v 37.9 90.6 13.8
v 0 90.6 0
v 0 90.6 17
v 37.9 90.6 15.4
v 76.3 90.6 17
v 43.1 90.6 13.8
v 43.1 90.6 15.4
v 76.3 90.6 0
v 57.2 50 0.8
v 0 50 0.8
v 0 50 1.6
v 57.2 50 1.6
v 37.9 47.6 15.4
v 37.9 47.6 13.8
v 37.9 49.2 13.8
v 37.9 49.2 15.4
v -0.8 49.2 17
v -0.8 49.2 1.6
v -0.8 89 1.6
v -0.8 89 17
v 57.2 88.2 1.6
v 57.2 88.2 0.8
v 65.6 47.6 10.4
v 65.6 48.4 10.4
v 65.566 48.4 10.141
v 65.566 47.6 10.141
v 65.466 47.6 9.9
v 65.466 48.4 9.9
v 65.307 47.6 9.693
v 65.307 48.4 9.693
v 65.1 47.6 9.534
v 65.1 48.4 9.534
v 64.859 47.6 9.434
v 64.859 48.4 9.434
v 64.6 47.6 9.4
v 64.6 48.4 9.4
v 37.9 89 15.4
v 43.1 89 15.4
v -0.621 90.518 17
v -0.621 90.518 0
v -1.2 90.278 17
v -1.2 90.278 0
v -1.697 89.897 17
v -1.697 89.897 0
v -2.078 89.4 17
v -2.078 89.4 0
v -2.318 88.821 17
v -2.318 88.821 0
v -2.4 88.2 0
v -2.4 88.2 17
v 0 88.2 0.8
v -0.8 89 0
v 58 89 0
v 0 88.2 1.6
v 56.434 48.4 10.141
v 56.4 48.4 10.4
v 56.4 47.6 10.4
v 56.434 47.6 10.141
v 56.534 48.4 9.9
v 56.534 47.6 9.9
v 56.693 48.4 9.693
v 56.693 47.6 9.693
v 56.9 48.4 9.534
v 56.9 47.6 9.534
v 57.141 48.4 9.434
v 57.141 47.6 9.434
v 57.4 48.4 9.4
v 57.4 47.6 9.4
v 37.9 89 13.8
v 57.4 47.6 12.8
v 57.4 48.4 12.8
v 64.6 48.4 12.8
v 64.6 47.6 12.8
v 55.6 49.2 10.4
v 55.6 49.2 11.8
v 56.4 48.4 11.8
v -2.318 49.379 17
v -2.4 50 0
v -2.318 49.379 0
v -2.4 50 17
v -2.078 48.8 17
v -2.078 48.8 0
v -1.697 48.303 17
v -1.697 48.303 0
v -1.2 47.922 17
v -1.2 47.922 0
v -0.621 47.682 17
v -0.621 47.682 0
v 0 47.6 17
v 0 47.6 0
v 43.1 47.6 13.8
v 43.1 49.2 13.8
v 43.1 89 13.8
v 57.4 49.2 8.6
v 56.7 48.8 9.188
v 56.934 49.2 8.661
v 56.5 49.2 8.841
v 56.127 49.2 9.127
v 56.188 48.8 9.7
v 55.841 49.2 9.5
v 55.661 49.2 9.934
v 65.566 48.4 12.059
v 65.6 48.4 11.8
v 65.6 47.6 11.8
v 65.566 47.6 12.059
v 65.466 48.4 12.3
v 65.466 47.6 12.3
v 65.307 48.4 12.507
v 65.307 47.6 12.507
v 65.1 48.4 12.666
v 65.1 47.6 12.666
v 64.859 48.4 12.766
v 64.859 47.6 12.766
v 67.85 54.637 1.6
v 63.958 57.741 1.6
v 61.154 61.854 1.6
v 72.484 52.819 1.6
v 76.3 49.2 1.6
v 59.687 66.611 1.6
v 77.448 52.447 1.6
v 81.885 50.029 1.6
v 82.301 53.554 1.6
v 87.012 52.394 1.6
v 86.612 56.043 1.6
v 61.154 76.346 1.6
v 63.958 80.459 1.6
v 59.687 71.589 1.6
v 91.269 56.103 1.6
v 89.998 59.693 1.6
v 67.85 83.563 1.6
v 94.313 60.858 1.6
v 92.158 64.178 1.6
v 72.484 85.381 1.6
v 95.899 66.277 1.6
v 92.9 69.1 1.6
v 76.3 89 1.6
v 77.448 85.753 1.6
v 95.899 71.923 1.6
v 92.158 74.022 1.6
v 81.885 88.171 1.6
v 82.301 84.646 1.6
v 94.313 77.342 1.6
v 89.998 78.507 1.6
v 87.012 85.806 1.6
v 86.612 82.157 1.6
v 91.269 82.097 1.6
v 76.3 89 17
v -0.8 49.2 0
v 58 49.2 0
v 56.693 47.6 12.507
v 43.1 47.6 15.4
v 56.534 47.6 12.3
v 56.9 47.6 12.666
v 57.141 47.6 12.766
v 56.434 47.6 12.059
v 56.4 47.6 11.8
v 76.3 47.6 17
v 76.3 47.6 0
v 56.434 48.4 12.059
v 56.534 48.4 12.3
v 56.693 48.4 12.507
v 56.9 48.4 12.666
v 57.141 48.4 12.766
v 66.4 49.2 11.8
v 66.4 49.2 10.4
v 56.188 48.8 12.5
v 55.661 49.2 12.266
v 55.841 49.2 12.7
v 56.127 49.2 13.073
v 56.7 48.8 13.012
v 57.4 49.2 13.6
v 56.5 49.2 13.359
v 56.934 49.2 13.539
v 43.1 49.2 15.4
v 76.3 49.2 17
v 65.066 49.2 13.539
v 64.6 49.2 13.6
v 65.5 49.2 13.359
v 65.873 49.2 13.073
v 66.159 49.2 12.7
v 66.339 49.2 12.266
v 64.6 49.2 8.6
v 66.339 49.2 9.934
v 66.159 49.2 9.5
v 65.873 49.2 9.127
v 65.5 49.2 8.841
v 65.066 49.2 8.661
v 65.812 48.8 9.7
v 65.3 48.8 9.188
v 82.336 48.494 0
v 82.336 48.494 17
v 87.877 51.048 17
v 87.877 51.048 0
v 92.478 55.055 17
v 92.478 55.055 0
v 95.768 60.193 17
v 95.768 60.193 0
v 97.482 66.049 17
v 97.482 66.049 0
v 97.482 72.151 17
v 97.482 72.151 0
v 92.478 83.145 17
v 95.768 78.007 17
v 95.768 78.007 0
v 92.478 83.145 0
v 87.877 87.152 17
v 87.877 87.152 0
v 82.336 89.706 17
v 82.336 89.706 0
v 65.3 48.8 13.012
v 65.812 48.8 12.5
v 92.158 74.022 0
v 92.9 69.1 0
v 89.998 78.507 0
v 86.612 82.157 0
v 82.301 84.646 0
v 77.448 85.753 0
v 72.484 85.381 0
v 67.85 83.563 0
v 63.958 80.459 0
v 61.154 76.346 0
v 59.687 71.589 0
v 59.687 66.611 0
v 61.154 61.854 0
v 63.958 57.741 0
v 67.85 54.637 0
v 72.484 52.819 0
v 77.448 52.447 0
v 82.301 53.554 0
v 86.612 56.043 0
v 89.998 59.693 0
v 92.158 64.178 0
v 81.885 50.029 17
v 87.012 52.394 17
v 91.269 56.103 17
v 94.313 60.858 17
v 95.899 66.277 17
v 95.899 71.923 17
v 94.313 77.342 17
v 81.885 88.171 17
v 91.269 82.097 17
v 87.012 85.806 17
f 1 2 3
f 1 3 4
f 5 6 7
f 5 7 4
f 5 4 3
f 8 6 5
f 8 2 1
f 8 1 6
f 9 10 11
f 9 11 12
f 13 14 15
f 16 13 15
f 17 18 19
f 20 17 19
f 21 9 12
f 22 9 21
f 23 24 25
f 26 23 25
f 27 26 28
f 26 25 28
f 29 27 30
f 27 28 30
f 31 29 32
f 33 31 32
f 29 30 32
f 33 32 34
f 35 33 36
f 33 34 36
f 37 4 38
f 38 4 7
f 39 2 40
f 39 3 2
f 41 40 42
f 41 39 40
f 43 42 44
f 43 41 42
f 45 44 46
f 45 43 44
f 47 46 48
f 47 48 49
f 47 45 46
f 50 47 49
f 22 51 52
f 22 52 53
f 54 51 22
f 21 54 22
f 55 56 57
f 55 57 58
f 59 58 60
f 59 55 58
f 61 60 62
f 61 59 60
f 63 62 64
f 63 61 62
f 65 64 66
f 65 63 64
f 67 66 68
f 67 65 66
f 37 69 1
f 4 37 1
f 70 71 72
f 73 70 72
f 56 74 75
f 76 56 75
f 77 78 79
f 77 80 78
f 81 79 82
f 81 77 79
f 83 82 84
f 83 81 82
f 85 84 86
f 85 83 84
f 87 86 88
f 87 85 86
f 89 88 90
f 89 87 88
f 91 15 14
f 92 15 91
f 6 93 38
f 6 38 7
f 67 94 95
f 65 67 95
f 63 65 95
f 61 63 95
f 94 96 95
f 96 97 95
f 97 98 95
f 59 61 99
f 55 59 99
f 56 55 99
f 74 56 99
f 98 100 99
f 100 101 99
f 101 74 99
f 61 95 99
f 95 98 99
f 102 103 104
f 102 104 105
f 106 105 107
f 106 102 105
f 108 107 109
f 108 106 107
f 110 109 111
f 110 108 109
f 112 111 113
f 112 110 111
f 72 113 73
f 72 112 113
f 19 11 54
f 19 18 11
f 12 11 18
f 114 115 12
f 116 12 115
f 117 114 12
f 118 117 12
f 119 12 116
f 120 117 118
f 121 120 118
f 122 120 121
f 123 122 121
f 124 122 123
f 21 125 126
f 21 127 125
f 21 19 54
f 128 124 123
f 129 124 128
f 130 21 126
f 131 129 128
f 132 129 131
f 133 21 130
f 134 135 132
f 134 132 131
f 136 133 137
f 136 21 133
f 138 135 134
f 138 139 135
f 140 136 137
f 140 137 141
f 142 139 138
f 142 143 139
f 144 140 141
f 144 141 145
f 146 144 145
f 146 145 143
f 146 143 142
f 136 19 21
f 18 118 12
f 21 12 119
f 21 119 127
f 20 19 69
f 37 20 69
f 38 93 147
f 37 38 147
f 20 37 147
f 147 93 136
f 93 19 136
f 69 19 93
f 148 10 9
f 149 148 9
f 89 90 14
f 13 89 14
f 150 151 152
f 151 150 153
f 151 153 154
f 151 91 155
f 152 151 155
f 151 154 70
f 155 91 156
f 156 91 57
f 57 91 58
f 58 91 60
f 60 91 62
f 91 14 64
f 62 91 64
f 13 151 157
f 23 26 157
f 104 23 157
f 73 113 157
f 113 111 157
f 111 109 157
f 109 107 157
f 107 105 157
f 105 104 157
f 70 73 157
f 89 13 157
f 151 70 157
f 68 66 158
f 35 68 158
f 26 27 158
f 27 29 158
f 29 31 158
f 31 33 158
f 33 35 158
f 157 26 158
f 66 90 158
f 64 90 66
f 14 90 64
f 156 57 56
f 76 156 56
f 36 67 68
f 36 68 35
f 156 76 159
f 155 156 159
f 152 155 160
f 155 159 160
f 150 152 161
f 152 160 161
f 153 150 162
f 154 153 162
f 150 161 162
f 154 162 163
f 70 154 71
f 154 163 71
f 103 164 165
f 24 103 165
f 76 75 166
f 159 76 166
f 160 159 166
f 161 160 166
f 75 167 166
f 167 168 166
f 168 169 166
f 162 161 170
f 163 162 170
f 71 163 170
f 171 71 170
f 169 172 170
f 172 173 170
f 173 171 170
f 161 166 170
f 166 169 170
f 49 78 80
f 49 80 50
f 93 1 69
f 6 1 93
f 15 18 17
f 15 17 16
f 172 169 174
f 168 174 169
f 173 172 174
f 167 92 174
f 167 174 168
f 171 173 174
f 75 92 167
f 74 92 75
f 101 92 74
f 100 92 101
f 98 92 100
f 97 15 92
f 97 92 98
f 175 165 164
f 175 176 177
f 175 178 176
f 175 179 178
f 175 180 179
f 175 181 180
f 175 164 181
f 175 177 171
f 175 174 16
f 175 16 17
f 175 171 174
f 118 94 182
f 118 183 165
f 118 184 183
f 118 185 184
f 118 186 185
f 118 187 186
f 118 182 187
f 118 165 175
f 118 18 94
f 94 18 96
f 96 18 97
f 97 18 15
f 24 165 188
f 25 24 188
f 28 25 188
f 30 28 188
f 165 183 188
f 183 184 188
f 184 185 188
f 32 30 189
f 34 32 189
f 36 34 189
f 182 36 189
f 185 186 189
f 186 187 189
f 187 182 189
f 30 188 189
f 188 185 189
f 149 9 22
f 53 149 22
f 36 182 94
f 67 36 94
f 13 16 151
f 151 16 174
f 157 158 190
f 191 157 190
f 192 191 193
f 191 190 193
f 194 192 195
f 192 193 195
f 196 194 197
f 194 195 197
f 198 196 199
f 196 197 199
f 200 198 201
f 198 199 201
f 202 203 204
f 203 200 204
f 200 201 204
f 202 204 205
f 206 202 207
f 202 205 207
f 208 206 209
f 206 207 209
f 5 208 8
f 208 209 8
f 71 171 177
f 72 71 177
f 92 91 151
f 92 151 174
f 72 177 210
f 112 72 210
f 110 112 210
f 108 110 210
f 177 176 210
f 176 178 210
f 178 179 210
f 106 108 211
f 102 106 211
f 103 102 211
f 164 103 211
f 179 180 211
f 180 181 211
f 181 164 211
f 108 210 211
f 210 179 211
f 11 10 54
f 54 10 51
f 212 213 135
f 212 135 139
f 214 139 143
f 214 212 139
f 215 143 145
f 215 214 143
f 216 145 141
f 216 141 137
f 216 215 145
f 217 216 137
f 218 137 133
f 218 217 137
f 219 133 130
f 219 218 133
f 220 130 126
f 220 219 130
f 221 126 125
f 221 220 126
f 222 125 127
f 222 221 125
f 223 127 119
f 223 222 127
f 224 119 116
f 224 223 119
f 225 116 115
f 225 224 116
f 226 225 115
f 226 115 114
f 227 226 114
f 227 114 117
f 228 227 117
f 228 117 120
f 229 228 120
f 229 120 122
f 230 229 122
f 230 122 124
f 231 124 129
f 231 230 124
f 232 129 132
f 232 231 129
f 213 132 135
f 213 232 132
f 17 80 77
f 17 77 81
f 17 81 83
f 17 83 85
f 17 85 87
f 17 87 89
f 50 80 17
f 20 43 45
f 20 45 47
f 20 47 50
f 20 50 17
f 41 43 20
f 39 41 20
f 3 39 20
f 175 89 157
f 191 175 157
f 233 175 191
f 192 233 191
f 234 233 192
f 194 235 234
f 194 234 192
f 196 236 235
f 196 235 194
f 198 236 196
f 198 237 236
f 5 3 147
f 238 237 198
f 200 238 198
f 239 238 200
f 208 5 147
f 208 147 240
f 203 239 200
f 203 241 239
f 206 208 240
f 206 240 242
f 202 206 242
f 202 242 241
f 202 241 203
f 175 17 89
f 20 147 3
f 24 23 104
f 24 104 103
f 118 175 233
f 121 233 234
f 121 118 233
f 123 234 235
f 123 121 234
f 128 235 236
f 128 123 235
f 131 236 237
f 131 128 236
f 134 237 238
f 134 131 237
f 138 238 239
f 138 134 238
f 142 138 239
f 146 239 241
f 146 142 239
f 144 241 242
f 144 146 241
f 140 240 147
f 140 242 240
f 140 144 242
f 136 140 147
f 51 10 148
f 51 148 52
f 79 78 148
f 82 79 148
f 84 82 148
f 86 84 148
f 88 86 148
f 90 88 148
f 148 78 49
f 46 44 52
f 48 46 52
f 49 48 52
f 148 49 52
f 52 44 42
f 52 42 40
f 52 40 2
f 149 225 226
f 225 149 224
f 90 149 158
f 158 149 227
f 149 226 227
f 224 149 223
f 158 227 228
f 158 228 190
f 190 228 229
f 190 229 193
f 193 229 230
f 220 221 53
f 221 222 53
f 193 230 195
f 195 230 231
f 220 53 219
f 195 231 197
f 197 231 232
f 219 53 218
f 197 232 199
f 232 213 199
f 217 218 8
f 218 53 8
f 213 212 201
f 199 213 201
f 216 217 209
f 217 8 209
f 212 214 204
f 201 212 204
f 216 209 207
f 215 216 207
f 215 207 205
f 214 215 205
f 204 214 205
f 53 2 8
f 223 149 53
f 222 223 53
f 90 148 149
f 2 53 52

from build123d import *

# Parameters (mm, degrees)
BOX011_W          = 9.2
BOX011_H          = 10
BOX011_DEPTH      = 3.4
FILLET005_R       = 1
BOX010_W          = 5.2
BOX010_H          = 50
BOX010_DEPTH      = 1.6
BOX008_W          = 57.2
BOX008_H          = 38.2
BOX008_DEPTH      = 1.6
CYLINDER012_R     = 16.7
CYLINDER012_DEPTH = 1.6
CYLINDER011_R     = 19.9
CYLINDER011_DEPTH = 17
BOX007_W          = 77.1
BOX007_H          = 39.8
BOX007_DEPTH      = 17
CYLINDER010_R     = 21.5
CYLINDER010_DEPTH = 17
BOX006_W          = 78.7
BOX006_H          = 43
BOX006_DEPTH      = 17
FILLET002_R       = 2.4
CHAMFER005_SIZE   = 0.8
CHAMFER013_SIZE   = 0.8


with BuildPart() as usb:
    # Box011 → Box011 (new body)
    with BuildSketch(Plane(origin=(56.4, 45, 9.4), x_dir=(1, 0, 0), z_dir=(0, 0, 1))):
        with Locations((4.6, 5)):
            Rectangle(BOX011_W, BOX011_H)
    extrude(amount=BOX011_DEPTH)

    # Fillet005
    fillet005_edges = [usb.edges().sort_by_distance(p)[0] for p in [
        (56.4, 50, 12.8),
        (56.4, 50, 9.4),
        (65.6, 50, 12.8),
        (65.6, 50, 9.4),
    ]]
    fillet(fillet005_edges, radius=FILLET005_R)


with BuildPart() as w_rfel010:
    # Box010 → Box010 (new body)
    with BuildSketch(Plane(origin=(37.9, 45, 13.8), x_dir=(1, 0, 0), z_dir=(0, 0, 1))):
        with Locations((2.6, 25)):
            Rectangle(BOX010_W, BOX010_H)
    extrude(amount=BOX010_DEPTH)


with BuildPart() as w_rfel008:
    # Box008 → Box008 (new body)
    with BuildSketch(Plane(origin=(0, 50, 0), x_dir=(1, 0, 0), z_dir=(0, 0, 1))):
        with Locations((28.6, 19.1)):
            Rectangle(BOX008_W, BOX008_H)
    extrude(amount=BOX008_DEPTH)


with BuildPart() as zylinder012:
    # Cylinder012 → Cylinder012 (new body)
    with BuildSketch(Plane(origin=(76.2, 69.1, 0), x_dir=(1, 0, 0), z_dir=(0, 0, 1))):
        Circle(CYLINDER012_R)
    extrude(amount=CYLINDER012_DEPTH)


with BuildPart() as zylinder011:
    # Cylinder011 → Cylinder011 (new body)
    with BuildSketch(Plane(origin=(76.2, 69.1, 1.6), x_dir=(1, 0, 0), z_dir=(0, 0, 1))):
        Circle(CYLINDER011_R)
    extrude(amount=CYLINDER011_DEPTH)


with BuildPart() as fusion009:
    # Box007 → Box007 (new body)
    with BuildSketch(Plane(origin=(-0.8, 49.2, 1.6), x_dir=(1, 0, 0), z_dir=(0, 0, 1))):
        with Locations((38.55, 19.9)):
            Rectangle(BOX007_W, BOX007_H)
    extrude(amount=BOX007_DEPTH)

    # Fusion009: union Zylinder011
    add(zylinder011.part)


with BuildPart() as zylinder010:
    # Cylinder010 → Cylinder010 (new body)
    with BuildSketch(Plane(origin=(76.2, 69.1, 0), x_dir=(1, 0, 0), z_dir=(0, 0, 1))):
        Circle(CYLINDER010_R)
    extrude(amount=CYLINDER010_DEPTH)


with BuildPart() as top:
    # Box006 → Box006 (new body)
    with BuildSketch(Plane(origin=(-2.4, 47.6, 0), x_dir=(1, 0, 0), z_dir=(0, 0, 1))):
        with Locations((39.35, 21.5)):
            Rectangle(BOX006_W, BOX006_H)
    extrude(amount=BOX006_DEPTH)

    # Fusion008: union Zylinder010
    add(zylinder010.part)

    # Cut004: cut Fusion009
    add(fusion009.part, mode=Mode.SUBTRACT)

    # Fillet002
    fillet002_edges = [top.edges().sort_by_distance(p)[0] for p in [
        (-2.4, 47.6, 8.5),
        (-2.4, 90.6, 8.5),
    ]]
    fillet(fillet002_edges, radius=FILLET002_R)

    # Cut005: cut Zylinder012
    add(zylinder012.part, mode=Mode.SUBTRACT)

    # Cut006: cut Würfel008
    add(w_rfel008.part, mode=Mode.SUBTRACT)

    # Chamfer005
    chamfer005_edges = [top.edges().sort_by_distance(p)[0] for p in [
        (57.2, 83.681153, 0),
        (28.6, 88.2, 0),
        (0, 69.1, 0),
        (28.6, 50, 0),
        (57.2, 54.518847, 0),
        (57.2, 69.1, 0),
    ]]
    chamfer(chamfer005_edges, length=CHAMFER005_SIZE)

    # Cut011: cut Würfel010
    add(w_rfel010.part, mode=Mode.SUBTRACT)

    # Cut018: cut USB
    add(usb.part, mode=Mode.SUBTRACT)

    # Chamfer013
    chamfer013_edges = [top.edges().sort_by_distance(p)[0] for p in [
        (56.692893, 49.2, 12.507107),
        (61, 49.2, 12.8),
        (65.307107, 49.2, 12.507107),
        (65.6, 49.2, 11.1),
        (65.307107, 49.2, 9.692893),
        (61, 49.2, 9.4),
        (56.692893, 49.2, 9.692893),
        (56.4, 49.2, 11.1),
    ]]
    chamfer(chamfer013_edges, length=CHAMFER013_SIZE)


solid = top.part
